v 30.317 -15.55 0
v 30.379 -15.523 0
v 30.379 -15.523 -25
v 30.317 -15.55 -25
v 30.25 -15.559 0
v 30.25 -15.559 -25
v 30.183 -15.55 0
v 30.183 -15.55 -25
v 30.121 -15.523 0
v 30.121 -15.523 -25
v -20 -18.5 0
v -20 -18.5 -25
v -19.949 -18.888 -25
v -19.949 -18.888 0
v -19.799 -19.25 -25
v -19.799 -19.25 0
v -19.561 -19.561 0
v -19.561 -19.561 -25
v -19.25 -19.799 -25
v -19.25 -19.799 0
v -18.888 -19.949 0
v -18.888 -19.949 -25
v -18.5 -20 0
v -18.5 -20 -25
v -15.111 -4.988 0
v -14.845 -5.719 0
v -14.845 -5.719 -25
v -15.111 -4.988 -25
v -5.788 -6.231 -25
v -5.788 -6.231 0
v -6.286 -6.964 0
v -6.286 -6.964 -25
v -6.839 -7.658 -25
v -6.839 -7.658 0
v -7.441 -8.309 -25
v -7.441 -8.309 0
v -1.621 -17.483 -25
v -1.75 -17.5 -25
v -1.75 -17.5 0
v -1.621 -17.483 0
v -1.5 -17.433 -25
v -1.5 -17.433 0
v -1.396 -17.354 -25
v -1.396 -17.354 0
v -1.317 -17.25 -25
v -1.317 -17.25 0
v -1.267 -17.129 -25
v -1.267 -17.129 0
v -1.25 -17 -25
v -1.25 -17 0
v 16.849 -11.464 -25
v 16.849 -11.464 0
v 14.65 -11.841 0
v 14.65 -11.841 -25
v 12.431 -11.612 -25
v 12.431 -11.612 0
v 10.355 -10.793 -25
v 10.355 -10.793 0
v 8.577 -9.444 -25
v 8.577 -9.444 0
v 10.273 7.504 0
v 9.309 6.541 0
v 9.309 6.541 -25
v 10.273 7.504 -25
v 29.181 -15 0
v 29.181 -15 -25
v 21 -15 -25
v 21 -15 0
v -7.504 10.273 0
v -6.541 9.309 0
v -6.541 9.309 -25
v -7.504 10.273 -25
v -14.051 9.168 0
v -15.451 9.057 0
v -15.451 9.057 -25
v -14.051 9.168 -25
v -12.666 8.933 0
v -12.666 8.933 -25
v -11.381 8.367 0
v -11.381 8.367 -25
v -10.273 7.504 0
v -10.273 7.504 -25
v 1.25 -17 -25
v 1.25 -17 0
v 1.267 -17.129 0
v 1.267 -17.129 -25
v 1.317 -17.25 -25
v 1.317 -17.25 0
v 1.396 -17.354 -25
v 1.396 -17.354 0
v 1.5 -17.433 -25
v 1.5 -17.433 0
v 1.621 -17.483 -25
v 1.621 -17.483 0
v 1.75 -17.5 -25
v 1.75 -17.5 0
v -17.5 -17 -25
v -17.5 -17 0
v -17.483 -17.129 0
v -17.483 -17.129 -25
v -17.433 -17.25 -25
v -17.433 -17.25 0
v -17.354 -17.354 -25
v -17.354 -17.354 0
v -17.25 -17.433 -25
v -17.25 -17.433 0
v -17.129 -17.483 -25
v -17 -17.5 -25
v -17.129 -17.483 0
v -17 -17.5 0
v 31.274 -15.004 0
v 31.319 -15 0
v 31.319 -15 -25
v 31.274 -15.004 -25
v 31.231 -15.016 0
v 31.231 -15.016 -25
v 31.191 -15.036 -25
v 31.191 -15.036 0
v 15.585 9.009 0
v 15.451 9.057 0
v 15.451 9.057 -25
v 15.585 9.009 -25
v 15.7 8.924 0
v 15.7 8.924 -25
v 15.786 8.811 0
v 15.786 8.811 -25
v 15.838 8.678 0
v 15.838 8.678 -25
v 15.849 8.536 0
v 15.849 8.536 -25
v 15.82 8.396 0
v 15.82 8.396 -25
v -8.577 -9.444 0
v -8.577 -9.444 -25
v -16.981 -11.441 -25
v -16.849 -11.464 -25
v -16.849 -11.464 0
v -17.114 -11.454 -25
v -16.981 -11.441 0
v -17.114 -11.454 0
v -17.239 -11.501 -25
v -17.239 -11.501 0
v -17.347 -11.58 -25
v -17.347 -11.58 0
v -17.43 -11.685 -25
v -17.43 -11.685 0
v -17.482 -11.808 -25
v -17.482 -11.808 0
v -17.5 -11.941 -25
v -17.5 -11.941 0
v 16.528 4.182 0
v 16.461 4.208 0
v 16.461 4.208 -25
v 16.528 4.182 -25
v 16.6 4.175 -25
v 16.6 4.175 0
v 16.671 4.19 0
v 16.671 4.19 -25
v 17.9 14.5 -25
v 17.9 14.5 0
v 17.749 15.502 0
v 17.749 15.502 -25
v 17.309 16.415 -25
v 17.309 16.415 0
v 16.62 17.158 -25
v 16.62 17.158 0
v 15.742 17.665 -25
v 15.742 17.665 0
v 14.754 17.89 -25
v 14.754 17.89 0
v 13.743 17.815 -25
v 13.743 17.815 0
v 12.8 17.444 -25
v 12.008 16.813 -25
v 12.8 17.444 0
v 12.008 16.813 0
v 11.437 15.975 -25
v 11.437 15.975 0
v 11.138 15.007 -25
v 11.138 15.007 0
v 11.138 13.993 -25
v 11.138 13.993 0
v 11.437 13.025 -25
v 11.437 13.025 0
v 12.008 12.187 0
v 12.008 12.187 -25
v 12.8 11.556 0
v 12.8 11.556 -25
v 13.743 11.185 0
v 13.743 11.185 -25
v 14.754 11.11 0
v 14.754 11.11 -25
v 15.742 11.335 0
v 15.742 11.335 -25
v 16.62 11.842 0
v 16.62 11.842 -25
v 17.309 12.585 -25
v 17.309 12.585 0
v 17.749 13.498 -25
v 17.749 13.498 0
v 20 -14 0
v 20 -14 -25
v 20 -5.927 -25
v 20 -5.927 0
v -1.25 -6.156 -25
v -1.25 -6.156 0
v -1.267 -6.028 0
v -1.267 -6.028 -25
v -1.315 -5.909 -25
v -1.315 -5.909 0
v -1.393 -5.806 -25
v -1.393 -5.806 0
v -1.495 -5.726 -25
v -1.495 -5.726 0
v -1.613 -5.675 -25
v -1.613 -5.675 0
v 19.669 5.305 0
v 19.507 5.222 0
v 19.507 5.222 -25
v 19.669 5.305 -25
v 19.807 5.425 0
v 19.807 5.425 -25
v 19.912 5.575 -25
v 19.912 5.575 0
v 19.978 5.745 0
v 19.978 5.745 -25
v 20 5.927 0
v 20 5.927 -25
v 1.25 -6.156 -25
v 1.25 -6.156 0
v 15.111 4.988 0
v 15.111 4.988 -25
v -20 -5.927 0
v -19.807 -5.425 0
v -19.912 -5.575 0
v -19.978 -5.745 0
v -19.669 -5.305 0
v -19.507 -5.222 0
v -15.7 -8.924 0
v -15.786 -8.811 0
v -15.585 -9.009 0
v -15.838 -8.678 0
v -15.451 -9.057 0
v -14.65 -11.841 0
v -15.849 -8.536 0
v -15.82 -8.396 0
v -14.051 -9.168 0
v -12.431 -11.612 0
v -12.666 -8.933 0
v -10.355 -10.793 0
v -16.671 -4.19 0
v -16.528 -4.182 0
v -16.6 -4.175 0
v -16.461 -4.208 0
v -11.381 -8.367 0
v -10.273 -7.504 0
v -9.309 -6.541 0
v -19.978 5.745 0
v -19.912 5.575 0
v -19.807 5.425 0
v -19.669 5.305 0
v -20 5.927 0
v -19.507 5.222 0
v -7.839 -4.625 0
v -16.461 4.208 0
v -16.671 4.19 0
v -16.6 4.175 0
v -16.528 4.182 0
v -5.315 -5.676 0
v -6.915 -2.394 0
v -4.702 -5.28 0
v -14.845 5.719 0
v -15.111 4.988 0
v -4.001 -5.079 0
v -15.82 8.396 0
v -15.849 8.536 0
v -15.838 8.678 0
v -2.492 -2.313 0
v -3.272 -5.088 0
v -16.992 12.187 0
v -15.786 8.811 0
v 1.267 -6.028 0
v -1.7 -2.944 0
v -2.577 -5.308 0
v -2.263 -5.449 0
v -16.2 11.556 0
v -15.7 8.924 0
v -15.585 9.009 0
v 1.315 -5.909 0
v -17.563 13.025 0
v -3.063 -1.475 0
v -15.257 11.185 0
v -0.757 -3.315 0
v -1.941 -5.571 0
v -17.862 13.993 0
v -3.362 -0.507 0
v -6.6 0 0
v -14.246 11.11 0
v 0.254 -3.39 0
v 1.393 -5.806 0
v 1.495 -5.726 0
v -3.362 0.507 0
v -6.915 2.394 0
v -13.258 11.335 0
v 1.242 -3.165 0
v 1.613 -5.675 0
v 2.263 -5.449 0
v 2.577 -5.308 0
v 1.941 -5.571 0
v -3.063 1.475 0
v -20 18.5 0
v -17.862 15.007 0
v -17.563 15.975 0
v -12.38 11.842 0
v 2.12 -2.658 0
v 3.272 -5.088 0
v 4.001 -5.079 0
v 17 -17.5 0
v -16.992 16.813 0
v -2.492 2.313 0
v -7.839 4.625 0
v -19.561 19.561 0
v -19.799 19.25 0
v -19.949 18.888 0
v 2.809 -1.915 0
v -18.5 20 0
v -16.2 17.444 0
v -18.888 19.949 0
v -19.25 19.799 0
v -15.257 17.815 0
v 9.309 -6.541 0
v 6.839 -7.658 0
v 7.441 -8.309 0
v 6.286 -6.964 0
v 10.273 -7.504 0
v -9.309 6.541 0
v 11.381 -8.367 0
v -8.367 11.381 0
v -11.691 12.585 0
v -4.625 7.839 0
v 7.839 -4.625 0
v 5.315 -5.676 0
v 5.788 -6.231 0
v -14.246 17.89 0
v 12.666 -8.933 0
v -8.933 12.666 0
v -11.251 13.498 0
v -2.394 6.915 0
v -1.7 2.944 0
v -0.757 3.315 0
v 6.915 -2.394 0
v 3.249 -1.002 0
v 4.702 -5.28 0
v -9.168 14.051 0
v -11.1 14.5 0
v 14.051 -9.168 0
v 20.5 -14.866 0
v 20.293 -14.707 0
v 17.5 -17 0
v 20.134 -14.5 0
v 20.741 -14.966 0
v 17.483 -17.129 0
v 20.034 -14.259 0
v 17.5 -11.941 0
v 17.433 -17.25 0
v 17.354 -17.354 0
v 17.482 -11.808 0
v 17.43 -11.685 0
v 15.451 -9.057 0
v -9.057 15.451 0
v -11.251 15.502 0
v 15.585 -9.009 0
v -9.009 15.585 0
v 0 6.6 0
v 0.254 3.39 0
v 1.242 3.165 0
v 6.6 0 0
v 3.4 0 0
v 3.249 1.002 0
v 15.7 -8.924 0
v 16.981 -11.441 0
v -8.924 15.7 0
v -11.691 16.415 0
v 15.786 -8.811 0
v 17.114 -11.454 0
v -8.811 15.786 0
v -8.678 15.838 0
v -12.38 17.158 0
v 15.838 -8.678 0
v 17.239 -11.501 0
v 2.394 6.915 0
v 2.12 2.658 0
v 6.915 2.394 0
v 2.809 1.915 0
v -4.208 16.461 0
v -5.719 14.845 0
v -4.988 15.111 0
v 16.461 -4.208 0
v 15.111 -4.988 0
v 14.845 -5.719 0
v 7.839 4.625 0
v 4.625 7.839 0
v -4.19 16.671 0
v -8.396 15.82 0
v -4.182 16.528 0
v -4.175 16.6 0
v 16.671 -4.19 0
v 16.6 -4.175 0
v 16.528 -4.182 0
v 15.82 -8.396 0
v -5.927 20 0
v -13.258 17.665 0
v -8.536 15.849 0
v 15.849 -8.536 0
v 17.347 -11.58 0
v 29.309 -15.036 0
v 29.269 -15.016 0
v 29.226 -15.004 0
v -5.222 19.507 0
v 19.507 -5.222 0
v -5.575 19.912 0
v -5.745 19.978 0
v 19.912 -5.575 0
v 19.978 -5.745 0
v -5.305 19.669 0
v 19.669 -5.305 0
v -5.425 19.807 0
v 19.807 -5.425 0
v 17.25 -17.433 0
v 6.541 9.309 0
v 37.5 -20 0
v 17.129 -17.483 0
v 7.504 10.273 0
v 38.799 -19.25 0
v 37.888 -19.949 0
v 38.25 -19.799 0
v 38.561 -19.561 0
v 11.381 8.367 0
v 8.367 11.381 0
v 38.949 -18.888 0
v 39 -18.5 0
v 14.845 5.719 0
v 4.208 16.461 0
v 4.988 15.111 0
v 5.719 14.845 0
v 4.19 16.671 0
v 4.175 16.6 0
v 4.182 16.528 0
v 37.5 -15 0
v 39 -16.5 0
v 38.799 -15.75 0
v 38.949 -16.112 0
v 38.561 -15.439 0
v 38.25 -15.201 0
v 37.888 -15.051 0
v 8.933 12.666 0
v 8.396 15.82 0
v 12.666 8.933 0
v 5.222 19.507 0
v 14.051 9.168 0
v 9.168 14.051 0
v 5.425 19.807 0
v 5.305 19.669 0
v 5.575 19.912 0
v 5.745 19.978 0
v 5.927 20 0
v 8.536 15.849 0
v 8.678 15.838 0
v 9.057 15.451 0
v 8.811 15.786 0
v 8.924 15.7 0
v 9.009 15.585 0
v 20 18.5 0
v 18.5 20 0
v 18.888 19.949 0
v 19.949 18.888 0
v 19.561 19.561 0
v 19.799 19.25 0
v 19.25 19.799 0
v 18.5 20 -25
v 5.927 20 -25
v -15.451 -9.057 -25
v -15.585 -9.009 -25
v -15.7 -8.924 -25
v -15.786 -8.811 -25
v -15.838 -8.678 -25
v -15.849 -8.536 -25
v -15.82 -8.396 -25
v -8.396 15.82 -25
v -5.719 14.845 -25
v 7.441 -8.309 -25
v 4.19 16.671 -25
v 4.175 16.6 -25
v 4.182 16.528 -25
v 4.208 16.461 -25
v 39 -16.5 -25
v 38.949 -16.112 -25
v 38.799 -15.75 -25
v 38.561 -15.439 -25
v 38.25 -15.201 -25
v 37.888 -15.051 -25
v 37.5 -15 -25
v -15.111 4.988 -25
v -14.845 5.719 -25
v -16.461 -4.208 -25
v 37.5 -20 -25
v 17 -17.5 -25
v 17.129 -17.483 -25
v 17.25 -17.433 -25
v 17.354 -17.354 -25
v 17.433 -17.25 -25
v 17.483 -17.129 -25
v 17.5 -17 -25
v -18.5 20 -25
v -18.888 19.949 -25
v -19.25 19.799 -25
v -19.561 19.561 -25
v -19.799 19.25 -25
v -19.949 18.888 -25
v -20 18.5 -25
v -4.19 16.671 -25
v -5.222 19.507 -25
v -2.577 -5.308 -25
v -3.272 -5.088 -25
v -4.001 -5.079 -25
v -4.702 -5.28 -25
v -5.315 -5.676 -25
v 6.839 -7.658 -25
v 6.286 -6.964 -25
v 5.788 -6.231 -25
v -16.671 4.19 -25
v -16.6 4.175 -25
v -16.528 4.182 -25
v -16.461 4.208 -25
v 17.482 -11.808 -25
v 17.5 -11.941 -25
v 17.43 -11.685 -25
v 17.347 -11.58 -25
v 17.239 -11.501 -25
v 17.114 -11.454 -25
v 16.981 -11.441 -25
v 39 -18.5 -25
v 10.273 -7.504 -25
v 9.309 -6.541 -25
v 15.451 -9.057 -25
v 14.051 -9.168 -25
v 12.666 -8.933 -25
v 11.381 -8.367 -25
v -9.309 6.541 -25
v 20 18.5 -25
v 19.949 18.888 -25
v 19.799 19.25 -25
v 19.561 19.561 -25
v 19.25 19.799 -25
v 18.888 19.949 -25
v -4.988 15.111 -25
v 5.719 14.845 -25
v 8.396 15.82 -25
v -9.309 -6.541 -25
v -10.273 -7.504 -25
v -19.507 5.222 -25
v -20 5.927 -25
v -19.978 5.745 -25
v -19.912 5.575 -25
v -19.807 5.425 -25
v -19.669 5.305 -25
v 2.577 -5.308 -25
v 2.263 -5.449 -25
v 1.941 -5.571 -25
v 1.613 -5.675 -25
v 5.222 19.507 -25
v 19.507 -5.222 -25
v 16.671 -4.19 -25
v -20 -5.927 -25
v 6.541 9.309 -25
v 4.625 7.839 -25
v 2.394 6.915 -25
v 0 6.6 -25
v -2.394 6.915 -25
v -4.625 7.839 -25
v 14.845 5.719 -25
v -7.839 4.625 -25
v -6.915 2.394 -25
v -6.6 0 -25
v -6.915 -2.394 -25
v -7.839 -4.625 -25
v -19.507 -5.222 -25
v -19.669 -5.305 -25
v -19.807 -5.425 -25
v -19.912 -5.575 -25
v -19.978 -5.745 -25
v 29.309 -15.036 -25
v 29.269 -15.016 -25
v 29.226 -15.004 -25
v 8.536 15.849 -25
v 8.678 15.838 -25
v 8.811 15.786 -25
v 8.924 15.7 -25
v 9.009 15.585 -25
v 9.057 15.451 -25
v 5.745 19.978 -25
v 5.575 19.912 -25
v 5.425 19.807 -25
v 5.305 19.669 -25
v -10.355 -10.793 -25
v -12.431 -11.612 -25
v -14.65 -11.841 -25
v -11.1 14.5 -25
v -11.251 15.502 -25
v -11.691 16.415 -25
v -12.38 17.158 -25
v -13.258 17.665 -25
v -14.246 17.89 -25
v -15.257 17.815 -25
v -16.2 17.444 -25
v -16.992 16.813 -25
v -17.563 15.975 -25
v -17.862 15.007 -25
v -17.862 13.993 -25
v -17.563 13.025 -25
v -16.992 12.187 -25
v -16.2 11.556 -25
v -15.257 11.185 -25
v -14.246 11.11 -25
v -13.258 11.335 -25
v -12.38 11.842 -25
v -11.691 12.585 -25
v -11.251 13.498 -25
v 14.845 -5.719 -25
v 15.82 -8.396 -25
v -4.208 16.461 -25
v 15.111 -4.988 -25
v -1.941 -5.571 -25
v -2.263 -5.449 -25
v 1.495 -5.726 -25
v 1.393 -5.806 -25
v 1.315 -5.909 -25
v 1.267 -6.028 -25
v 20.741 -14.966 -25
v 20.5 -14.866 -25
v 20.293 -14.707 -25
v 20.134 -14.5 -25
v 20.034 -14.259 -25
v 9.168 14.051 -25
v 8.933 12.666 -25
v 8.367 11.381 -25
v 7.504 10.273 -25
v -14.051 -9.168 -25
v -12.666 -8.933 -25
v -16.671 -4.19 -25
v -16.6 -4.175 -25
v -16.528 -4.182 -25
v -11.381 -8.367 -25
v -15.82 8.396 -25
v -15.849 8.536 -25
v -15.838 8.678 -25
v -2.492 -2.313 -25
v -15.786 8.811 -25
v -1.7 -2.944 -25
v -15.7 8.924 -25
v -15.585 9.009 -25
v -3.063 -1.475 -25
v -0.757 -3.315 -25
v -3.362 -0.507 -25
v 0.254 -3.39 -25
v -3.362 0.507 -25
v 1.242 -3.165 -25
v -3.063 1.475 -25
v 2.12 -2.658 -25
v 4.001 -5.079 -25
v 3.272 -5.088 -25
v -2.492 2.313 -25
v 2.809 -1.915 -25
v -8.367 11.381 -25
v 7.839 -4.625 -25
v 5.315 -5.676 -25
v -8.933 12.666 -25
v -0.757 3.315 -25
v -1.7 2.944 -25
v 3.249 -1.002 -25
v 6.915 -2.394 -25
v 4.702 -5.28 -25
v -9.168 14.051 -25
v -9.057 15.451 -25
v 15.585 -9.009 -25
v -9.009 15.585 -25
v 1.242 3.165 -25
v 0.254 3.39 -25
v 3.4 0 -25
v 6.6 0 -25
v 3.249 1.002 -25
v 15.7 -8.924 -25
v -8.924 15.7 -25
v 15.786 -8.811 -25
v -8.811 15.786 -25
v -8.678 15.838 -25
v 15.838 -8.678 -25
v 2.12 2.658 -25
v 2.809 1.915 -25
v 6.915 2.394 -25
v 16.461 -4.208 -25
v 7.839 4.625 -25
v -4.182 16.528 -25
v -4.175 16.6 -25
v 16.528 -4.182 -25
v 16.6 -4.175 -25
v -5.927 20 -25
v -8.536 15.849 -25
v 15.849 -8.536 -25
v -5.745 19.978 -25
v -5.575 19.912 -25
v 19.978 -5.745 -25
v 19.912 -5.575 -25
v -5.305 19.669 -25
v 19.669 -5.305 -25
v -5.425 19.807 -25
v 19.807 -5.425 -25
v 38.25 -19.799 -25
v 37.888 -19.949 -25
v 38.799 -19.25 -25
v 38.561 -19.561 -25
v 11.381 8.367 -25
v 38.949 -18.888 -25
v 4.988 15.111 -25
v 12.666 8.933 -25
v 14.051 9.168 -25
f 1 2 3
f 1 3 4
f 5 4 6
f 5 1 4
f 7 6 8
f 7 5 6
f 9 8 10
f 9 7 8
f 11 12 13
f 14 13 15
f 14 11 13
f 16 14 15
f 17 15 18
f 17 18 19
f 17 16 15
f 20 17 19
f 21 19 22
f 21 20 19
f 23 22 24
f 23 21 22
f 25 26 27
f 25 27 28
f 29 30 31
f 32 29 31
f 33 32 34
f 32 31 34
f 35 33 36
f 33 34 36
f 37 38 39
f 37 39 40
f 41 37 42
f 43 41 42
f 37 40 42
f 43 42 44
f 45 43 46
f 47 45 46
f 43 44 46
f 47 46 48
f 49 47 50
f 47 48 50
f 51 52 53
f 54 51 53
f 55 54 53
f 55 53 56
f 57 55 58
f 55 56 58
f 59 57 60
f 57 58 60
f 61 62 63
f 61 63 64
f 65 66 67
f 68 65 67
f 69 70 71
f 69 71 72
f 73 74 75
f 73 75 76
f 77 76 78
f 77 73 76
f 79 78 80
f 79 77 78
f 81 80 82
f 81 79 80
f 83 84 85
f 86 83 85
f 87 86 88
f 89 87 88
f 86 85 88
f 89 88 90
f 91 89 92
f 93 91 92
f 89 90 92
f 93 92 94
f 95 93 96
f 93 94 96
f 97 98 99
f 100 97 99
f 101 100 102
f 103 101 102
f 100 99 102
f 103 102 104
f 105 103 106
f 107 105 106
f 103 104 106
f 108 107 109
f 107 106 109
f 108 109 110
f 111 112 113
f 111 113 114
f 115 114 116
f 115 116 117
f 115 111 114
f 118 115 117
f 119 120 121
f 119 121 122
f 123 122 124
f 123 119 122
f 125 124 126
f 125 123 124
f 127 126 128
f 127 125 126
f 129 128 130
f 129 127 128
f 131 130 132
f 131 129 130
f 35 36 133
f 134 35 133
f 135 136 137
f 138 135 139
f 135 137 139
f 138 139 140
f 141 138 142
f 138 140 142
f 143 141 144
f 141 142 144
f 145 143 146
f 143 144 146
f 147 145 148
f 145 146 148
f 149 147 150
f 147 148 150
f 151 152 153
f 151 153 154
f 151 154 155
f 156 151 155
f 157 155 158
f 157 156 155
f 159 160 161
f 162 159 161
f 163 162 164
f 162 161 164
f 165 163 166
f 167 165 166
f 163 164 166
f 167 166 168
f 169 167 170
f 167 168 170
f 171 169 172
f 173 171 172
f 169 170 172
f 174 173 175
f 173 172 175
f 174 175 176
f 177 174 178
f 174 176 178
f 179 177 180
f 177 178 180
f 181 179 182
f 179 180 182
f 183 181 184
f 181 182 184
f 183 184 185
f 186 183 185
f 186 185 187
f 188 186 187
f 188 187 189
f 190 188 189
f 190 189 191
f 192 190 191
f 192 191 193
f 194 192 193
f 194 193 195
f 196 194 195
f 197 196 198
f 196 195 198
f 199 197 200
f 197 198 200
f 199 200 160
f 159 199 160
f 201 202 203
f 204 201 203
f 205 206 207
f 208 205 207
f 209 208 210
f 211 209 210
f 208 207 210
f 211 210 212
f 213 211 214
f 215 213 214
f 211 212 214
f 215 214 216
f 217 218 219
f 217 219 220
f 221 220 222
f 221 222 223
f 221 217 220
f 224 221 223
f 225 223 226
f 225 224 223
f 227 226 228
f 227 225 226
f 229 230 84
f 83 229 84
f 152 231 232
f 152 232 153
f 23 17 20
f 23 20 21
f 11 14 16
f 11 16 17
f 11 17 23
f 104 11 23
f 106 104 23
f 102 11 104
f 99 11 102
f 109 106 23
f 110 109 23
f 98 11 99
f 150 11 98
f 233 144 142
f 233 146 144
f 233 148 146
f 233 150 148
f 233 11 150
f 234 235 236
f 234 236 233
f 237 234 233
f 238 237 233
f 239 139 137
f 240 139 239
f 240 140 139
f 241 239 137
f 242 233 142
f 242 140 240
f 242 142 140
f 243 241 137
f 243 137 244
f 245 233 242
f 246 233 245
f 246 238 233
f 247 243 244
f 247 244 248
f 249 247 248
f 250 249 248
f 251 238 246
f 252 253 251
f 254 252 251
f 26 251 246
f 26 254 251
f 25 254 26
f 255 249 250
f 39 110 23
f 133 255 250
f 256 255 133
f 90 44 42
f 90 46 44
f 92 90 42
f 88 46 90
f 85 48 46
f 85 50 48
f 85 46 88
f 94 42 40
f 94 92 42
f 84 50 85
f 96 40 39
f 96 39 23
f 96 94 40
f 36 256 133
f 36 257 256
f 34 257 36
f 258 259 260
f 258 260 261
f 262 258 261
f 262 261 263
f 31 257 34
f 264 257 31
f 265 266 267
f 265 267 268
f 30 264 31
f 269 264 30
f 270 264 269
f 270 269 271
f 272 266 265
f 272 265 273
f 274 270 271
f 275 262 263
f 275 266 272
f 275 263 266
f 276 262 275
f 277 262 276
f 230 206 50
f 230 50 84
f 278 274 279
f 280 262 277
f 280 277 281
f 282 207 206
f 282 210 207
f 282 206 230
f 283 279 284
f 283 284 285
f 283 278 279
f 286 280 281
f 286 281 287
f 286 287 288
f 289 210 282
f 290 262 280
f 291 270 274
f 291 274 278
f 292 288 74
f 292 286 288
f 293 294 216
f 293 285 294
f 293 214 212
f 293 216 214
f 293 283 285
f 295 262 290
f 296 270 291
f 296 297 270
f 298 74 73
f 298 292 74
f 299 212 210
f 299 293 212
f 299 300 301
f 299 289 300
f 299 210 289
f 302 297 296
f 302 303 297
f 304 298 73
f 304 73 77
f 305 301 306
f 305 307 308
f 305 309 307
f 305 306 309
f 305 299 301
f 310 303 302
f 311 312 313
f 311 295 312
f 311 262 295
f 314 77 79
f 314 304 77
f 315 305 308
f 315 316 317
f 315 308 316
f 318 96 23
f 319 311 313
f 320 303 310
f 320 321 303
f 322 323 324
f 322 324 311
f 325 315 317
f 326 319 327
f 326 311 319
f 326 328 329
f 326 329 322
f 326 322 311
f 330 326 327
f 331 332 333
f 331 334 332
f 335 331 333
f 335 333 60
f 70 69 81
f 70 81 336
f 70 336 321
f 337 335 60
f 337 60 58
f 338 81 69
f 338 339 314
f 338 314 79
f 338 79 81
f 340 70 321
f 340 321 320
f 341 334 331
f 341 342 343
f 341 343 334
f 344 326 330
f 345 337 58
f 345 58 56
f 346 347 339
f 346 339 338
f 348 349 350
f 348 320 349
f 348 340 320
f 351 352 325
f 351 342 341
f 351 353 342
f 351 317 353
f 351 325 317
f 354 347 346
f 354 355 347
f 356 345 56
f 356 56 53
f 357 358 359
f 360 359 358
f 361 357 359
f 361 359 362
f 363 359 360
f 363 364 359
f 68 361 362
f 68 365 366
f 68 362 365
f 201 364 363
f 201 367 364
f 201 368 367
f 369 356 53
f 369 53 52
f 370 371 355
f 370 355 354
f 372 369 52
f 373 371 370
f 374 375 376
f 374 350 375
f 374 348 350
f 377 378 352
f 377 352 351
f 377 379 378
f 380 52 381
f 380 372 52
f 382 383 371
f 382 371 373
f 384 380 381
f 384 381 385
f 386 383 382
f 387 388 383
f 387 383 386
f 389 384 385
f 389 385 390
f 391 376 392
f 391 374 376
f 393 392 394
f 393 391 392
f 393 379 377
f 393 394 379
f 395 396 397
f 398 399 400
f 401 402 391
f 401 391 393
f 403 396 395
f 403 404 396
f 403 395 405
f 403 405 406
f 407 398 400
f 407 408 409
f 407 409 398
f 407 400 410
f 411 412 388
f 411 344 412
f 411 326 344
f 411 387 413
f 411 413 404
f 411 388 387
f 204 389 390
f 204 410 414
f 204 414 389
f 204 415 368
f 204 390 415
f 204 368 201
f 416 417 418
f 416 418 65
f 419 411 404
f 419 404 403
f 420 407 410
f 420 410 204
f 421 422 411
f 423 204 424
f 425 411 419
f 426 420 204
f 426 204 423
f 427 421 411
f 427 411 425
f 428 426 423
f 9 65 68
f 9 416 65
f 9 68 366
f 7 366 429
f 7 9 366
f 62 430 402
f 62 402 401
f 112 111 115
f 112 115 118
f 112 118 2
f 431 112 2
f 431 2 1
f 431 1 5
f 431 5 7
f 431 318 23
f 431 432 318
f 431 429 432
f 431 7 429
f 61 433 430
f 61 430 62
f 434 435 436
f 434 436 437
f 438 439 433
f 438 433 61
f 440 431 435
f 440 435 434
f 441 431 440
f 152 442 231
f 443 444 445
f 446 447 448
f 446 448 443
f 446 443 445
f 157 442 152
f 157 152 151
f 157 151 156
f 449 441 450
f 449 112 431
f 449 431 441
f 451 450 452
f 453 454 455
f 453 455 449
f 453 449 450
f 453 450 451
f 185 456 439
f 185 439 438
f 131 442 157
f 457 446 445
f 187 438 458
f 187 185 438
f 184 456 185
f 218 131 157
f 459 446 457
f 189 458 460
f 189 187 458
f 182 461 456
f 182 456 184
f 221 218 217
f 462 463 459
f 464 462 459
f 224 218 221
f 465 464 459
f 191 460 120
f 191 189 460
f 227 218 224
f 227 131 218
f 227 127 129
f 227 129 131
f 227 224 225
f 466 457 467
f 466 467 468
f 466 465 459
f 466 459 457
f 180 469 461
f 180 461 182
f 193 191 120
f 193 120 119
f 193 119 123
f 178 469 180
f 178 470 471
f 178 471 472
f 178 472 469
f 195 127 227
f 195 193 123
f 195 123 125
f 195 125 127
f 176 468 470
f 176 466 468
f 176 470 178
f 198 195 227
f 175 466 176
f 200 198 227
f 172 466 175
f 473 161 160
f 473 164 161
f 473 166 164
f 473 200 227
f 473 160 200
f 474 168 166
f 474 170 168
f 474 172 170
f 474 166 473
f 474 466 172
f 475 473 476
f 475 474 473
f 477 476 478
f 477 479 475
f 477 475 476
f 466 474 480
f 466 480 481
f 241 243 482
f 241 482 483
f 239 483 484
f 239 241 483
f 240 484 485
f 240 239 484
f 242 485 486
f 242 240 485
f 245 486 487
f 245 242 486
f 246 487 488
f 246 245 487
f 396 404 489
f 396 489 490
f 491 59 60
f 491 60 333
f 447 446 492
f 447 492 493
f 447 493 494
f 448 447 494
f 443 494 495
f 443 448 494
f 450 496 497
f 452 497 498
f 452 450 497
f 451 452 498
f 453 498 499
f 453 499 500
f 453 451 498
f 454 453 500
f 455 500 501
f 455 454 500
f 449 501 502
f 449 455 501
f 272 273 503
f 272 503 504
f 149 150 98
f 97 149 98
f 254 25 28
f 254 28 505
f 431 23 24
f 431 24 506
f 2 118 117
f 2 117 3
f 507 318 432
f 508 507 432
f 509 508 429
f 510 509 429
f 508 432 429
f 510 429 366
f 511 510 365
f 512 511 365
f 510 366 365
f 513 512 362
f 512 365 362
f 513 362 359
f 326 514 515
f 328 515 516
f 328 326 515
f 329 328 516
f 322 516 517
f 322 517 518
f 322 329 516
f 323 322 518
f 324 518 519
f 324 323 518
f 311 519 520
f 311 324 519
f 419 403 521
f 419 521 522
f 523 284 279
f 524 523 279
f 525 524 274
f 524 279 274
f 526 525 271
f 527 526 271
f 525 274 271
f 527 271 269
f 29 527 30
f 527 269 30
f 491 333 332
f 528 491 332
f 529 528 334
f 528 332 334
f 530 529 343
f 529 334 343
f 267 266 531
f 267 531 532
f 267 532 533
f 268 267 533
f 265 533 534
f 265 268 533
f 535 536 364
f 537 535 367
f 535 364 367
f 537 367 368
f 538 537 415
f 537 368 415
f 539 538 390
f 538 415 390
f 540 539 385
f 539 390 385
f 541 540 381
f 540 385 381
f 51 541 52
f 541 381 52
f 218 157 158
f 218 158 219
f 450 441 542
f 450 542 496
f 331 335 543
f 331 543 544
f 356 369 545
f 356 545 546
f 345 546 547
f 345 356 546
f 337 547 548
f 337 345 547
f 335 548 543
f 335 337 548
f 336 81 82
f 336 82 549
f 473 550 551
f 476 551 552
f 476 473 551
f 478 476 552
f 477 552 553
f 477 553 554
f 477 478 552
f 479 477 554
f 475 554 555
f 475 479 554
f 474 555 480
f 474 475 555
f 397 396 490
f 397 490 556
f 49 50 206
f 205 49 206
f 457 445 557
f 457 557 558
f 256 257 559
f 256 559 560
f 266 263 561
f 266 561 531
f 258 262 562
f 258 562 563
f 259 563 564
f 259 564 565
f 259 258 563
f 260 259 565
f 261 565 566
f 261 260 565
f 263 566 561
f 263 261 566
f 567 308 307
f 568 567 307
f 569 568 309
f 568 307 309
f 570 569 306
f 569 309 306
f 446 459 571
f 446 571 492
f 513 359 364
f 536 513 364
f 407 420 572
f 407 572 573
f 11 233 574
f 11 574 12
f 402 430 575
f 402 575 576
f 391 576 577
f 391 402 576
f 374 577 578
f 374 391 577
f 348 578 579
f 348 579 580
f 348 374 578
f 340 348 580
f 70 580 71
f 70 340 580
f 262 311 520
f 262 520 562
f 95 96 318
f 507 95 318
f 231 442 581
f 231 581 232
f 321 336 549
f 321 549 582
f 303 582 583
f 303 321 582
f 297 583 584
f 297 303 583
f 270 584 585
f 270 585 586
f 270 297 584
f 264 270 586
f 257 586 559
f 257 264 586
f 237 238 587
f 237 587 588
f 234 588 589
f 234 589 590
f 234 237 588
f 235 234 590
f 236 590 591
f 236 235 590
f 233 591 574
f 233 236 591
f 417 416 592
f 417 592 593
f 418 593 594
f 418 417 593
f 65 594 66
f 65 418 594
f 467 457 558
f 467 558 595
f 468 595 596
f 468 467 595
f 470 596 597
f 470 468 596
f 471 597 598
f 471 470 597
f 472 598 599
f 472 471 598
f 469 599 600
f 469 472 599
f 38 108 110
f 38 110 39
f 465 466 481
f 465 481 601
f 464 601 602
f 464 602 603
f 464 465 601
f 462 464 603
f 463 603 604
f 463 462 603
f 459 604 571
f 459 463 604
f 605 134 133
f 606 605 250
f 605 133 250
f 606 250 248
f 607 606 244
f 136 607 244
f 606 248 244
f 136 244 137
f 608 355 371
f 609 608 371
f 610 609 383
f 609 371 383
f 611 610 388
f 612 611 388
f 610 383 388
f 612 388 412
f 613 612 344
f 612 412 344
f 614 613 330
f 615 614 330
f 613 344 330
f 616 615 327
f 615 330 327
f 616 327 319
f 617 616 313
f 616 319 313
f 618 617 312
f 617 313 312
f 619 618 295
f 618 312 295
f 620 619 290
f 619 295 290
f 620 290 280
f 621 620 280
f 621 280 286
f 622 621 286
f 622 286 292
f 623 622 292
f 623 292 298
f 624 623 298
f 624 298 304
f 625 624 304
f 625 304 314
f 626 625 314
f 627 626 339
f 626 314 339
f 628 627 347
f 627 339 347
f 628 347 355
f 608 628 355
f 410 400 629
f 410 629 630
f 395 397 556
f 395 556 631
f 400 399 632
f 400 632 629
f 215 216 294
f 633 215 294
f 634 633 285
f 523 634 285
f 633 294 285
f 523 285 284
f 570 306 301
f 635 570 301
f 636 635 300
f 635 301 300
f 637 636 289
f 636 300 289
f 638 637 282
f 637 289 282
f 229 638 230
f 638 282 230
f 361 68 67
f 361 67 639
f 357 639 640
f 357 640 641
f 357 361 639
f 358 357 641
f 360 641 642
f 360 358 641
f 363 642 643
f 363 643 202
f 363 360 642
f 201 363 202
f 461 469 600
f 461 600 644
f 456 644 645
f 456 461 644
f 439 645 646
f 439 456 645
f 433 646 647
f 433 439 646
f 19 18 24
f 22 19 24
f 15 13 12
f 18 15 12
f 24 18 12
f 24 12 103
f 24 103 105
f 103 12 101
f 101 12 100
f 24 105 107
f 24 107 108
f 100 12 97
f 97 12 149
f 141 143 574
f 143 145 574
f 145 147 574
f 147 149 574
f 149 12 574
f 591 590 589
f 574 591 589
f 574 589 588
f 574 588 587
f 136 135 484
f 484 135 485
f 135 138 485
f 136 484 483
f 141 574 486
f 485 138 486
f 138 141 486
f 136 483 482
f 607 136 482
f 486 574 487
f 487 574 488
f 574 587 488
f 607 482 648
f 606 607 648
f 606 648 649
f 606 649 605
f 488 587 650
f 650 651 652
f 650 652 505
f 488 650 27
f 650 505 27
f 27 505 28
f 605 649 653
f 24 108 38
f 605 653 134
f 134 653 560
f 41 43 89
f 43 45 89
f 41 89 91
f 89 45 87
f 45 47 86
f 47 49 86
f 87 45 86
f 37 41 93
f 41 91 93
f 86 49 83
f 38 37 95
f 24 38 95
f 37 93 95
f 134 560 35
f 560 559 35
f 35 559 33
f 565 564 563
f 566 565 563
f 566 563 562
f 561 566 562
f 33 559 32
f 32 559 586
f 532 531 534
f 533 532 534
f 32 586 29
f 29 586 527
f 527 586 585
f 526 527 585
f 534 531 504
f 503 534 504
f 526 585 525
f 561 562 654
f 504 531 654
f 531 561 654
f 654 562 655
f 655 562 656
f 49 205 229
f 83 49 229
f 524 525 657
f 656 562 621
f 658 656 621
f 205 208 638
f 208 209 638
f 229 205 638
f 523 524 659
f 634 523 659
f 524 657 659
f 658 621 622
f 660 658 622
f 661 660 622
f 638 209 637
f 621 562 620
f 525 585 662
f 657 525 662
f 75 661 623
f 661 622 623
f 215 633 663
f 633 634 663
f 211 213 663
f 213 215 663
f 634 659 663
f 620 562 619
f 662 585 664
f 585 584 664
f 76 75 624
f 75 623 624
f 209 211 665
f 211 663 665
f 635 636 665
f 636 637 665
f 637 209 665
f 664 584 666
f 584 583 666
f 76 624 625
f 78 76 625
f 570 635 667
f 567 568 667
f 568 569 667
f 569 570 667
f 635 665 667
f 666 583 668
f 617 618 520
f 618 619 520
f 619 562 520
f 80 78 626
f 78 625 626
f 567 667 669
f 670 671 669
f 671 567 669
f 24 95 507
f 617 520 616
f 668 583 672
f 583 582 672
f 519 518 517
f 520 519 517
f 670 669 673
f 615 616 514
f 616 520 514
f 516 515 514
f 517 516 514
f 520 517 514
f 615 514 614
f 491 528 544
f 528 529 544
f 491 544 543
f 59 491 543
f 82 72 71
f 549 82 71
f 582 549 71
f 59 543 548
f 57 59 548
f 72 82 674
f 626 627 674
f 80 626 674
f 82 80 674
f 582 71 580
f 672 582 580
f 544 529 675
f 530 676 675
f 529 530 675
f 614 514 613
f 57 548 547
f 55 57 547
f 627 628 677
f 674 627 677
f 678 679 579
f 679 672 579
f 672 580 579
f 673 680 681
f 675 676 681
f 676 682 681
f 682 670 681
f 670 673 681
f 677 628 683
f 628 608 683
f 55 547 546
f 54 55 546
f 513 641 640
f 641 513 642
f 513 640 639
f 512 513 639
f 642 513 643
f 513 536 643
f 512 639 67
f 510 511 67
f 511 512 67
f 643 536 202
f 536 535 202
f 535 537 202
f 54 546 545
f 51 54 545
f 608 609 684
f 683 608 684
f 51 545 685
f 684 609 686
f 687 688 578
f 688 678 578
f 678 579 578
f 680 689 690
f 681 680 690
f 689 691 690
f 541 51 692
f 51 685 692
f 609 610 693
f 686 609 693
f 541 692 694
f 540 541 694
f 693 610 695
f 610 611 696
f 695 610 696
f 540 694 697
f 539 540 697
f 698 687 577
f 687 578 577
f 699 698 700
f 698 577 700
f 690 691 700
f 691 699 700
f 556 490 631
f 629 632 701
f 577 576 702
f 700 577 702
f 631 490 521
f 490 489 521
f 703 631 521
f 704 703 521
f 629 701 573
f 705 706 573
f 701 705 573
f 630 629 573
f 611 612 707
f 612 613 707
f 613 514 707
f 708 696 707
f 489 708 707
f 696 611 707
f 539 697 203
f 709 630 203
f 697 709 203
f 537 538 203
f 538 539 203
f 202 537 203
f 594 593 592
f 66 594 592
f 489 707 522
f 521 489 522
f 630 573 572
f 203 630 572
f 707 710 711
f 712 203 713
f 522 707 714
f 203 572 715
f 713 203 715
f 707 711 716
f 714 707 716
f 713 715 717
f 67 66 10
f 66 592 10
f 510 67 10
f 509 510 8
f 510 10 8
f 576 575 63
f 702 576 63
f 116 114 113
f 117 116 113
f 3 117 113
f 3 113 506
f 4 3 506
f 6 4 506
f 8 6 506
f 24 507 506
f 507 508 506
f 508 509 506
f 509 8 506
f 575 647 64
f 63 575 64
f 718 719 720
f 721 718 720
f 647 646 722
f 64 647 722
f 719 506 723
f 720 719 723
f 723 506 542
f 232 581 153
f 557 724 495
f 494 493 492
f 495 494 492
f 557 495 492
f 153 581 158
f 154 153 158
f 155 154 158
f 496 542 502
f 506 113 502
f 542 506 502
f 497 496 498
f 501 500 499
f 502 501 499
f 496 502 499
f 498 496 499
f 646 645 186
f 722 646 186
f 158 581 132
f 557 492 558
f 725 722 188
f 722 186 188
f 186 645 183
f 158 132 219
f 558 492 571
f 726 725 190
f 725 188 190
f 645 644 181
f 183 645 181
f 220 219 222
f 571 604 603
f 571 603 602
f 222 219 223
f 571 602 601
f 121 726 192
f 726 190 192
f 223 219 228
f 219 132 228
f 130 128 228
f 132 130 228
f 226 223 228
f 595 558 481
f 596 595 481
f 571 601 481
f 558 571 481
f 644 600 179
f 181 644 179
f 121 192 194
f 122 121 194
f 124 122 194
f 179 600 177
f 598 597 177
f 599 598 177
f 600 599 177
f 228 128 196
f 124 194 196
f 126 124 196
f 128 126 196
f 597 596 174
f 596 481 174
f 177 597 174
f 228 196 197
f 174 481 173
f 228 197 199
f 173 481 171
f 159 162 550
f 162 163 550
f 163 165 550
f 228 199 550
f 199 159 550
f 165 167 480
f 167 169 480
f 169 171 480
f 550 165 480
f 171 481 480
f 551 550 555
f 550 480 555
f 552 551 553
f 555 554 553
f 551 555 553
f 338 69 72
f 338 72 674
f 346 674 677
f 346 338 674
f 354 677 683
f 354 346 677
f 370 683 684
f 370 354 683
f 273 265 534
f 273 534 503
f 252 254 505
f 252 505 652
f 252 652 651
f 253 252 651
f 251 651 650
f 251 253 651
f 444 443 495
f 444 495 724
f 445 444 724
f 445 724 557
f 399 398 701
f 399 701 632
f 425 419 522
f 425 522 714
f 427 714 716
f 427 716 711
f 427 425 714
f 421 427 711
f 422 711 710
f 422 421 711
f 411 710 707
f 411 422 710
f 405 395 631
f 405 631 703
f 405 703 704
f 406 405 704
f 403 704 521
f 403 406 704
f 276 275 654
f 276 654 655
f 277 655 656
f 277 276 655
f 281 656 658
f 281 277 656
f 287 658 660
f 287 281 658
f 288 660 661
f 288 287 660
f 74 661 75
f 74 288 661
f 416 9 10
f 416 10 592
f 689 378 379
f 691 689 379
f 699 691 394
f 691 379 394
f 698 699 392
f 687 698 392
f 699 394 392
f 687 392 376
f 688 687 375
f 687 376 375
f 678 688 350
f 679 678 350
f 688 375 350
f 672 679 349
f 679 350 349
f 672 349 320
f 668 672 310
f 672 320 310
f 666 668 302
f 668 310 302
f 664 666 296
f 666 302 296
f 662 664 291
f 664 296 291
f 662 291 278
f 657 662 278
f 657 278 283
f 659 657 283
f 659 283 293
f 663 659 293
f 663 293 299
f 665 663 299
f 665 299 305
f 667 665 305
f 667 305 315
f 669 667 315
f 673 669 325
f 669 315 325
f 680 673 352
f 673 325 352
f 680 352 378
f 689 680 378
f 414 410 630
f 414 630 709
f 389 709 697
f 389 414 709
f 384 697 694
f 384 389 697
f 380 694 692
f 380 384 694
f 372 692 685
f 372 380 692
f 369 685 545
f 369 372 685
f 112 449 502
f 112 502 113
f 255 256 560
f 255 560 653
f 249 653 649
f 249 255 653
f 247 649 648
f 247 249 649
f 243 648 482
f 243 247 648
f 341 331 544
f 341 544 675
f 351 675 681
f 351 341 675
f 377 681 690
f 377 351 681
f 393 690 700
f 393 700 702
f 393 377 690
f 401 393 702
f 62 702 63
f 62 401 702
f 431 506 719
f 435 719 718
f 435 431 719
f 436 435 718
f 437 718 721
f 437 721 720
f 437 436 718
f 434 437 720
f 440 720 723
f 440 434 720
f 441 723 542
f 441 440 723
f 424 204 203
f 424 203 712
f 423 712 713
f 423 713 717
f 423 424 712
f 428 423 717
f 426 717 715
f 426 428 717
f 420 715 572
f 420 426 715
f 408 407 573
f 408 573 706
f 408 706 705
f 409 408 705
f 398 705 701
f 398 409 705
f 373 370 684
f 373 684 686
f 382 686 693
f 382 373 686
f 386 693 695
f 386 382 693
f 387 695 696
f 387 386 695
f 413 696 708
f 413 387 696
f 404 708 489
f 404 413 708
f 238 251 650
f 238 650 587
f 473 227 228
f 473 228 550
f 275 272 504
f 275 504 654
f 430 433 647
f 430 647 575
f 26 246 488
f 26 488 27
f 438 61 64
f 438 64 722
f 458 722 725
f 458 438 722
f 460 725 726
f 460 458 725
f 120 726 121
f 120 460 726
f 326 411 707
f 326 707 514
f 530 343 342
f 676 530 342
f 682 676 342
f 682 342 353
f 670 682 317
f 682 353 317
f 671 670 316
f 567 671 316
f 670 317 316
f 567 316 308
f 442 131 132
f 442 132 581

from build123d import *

# Parameters (mm, degrees)
SK_MAIN_EXTRUSION_R  = 3.4
MAIN_EXTRUSION_DEPTH = 25


with BuildPart() as part:
    # Sk Main Extrusion → Main Extrusion (new body)
    with BuildSketch(Plane.XY):
        with BuildLine():
            Line((-16.671180212, -4.190076845), (-19.506515107, -5.222054351))
            ThreePointArc((-19.506515107, -5.222054351), (-19.864364033, -5.496641489), (-20, -5.926823816))
            Line((-20, -5.926823816), (-20, -18.5))
            ThreePointArc((-20, -18.5), (-19.560660172, -19.560660172), (-18.5, -20))
            Line((-18.5, -20), (37.5, -20))
            ThreePointArc((37.5, -20), (38.560660172, -19.560660172), (39, -18.5))
            Line((39, -18.5), (39, -16.5))
            ThreePointArc((39, -16.5), (38.560660172, -15.439339828), (37.5, -15))
            Line((37.5, -15), (31.319331136, -15))
            ThreePointArc((31.319331136, -15), (31.252521542, -15.009092387), (31.190571617, -15.035708175))
            Line((31.190571617, -15.035708175), (30.378759519, -15.523494095))
            ThreePointArc((30.378759519, -15.523494095), (30.25, -15.55920227), (30.121240481, -15.523494095))
            Line((30.121240481, -15.523494095), (29.309428383, -15.035708175))
            ThreePointArc((29.309428383, -15.035708175), (29.247478458, -15.009092387), (29.180668864, -15))
            Line((29.180668864, -15), (21, -15))
            ThreePointArc((21, -15), (20.292893219, -14.707106781), (20, -14))
            Line((20, -14), (20, -5.926823816))
            ThreePointArc((20, -5.926823816), (19.864364033, -5.496641489), (19.506515107, -5.222054351))
            Line((19.506515107, -5.222054351), (16.671180212, -4.190076845))
            ThreePointArc((16.671180212, -4.190076845), (16.563886241, -4.175951325), (16.460675177, -4.208493649))
            Line((16.460675177, -4.208493649), (15.111296024, -4.987558066))
            Line((15.111296024, -4.987558066), (14.845251581, -5.718509166))
            Line((14.845251581, -5.718509166), (15.81984631, -8.396186179))
            ThreePointArc((15.81984631, -8.396186179), (15.786489799, -8.811074612), (15.450654467, -9.056960151))
            ThreePointArc((15.450654467, -9.056960151), (12.665882372, -8.933433013), (10.272684887, -7.504160339))
            Line((10.272684887, -7.504160339), (9.309262274, -6.540737726))
            ThreePointArc((9.309262274, -6.540737726), (6.6, 0), (9.309262274, 6.540737726))
            Line((9.309262274, 6.540737726), (10.272684887, 7.504160339))
            ThreePointArc((10.272684887, 7.504160339), (12.665882372, 8.933433013), (15.450654467, 9.056960151))
            ThreePointArc((15.450654467, 9.056960151), (15.786489799, 8.811074612), (15.81984631, 8.396186179))
            Line((15.81984631, 8.396186179), (14.845251581, 5.718509166))
            Line((14.845251581, 5.718509166), (15.111296024, 4.987558066))
            Line((15.111296024, 4.987558066), (16.460675177, 4.208493649))
            ThreePointArc((16.460675177, 4.208493649), (16.563886241, 4.175951325), (16.671180212, 4.190076845))
            Line((16.671180212, 4.190076845), (19.506515107, 5.222054351))
            ThreePointArc((19.506515107, 5.222054351), (19.864364033, 5.496641489), (20, 5.926823816))
            Line((20, 5.926823816), (20, 18.5))
            ThreePointArc((20, 18.5), (19.560660172, 19.560660172), (18.5, 20))
            Line((18.5, 20), (5.926823816, 20))
            ThreePointArc((5.926823816, 20), (5.496641489, 19.864364033), (5.222054351, 19.506515107))
            Line((5.222054351, 19.506515107), (4.190076845, 16.671180212))
            ThreePointArc((4.190076845, 16.671180212), (4.175951325, 16.563886241), (4.208493649, 16.460675177))
            Line((4.208493649, 16.460675177), (4.987558066, 15.111296024))
            Line((4.987558066, 15.111296024), (5.718509166, 14.845251581))
            Line((5.718509166, 14.845251581), (8.396186179, 15.81984631))
            ThreePointArc((8.396186179, 15.81984631), (8.811074612, 15.786489799), (9.056960151, 15.450654467))
            ThreePointArc((9.056960151, 15.450654467), (8.933433013, 12.665882372), (7.504160339, 10.272684887))
            Line((7.504160339, 10.272684887), (6.540737726, 9.309262274))
            ThreePointArc((6.540737726, 9.309262274), (0, 6.6), (-6.540737726, 9.309262274))
            Line((-6.540737726, 9.309262274), (-7.504160339, 10.272684887))
            ThreePointArc((-7.504160339, 10.272684887), (-8.933433013, 12.665882372), (-9.056960151, 15.450654467))
            ThreePointArc((-9.056960151, 15.450654467), (-8.811074612, 15.786489799), (-8.396186179, 15.81984631))
            Line((-8.396186179, 15.81984631), (-5.718509166, 14.845251581))
            Line((-5.718509166, 14.845251581), (-4.987558066, 15.111296024))
            Line((-4.987558066, 15.111296024), (-4.208493649, 16.460675177))
            ThreePointArc((-4.208493649, 16.460675177), (-4.175951325, 16.563886241), (-4.190076845, 16.671180212))
            Line((-4.190076845, 16.671180212), (-5.222054351, 19.506515107))
            ThreePointArc((-5.222054351, 19.506515107), (-5.496641489, 19.864364033), (-5.926823816, 20))
            Line((-5.926823816, 20), (-18.5, 20))
            ThreePointArc((-18.5, 20), (-19.560660172, 19.560660172), (-20, 18.5))
            Line((-20, 18.5), (-20, 5.926823816))
            ThreePointArc((-20, 5.926823816), (-19.864364033, 5.496641489), (-19.506515107, 5.222054351))
            Line((-19.506515107, 5.222054351), (-16.671180212, 4.190076845))
            ThreePointArc((-16.671180212, 4.190076845), (-16.563886241, 4.175951325), (-16.460675177, 4.208493649))
            Line((-16.460675177, 4.208493649), (-15.111296024, 4.987558066))
            Line((-15.111296024, 4.987558066), (-14.845251581, 5.718509166))
            Line((-14.845251581, 5.718509166), (-15.81984631, 8.396186179))
            ThreePointArc((-15.81984631, 8.396186179), (-15.786489799, 8.811074612), (-15.450654467, 9.056960151))
            ThreePointArc((-15.450654467, 9.056960151), (-12.665882372, 8.933433013), (-10.272684887, 7.504160339))
            Line((-10.272684887, 7.504160339), (-9.309262274, 6.540737726))
            ThreePointArc((-9.309262274, 6.540737726), (-6.6, 0), (-9.309262274, -6.540737726))
            Line((-9.309262274, -6.540737726), (-10.272684887, -7.504160339))
            ThreePointArc((-10.272684887, -7.504160339), (-12.665882372, -8.933433013), (-15.450654467, -9.056960151))
            ThreePointArc((-15.450654467, -9.056960151), (-15.786489799, -8.811074612), (-15.81984631, -8.396186179))
            Line((-15.81984631, -8.396186179), (-14.845251581, -5.718509166))
            Line((-14.845251581, -5.718509166), (-15.111296024, -4.987558066))
            Line((-15.111296024, -4.987558066), (-16.460675177, -4.208493649))
            ThreePointArc((-16.460675177, -4.208493649), (-16.563886241, -4.175951325), (-16.671180212, -4.190076845))
        make_face()
        with Locations((14.5, 14.5)):
            Circle(SK_MAIN_EXTRUSION_R, mode=Mode.SUBTRACT)
        Circle(SK_MAIN_EXTRUSION_R, mode=Mode.SUBTRACT)
        with Locations((-14.5, 14.5)):
            Circle(SK_MAIN_EXTRUSION_R, mode=Mode.SUBTRACT)
        with BuildLine():
            Line((-7.441495321, -8.308504679), (-8.577273231, -9.444282589))
            ThreePointArc((-8.577273231, -9.444282589), (-12.430514315, -11.611987193), (-16.849169473, -11.464011904))
            ThreePointArc((-16.849169473, -11.464011904), (-17.295452819, -11.537349181), (-17.5, -11.940719521))
            Line((-17.5, -11.940719521), (-17.5, -17))
            ThreePointArc((-17.5, -17), (-17.353553391, -17.353553391), (-17, -17.5))
            Line((-17, -17.5), (-1.75, -17.5))
            ThreePointArc((-1.75, -17.5), (-1.396446609, -17.353553391), (-1.25, -17))
            Line((-1.25, -17), (-1.25, -6.156094541))
            ThreePointArc((-1.25, -6.156094541), (-1.351026708, -5.854730455), (-1.61328125, -5.675149655))
            ThreePointArc((-1.61328125, -5.675149655), (-2.10305366, -5.51245547), (-2.576734694, -5.307583096))
            ThreePointArc((-2.576734694, -5.307583096), (-4.359333373, -5.153883821), (-5.788120301, -6.230846881))
            ThreePointArc((-5.788120301, -6.230846881), (-6.555931161, -7.316529108), (-7.441495321, -8.308504679))
        make_face(mode=Mode.SUBTRACT)
        with BuildLine():
            Line((1.25, -6.156094541), (1.25, -17))
            ThreePointArc((1.25, -17), (1.396446609, -17.353553391), (1.75, -17.5))
            Line((1.75, -17.5), (17, -17.5))
            ThreePointArc((17, -17.5), (17.353553391, -17.353553391), (17.5, -17))
            Line((17.5, -17), (17.5, -11.940719521))
            ThreePointArc((17.5, -11.940719521), (17.295452819, -11.537349181), (16.849169473, -11.464011904))
            ThreePointArc((16.849169473, -11.464011904), (12.430514315, -11.611987193), (8.577273231, -9.444282589))
            Line((8.577273231, -9.444282589), (7.441495321, -8.308504679))
            ThreePointArc((7.441495321, -8.308504679), (6.555931161, -7.316529108), (5.788120301, -6.230846881))
            ThreePointArc((5.788120301, -6.230846881), (4.359333373, -5.153883821), (2.576734694, -5.307583096))
            ThreePointArc((2.576734694, -5.307583096), (2.10305366, -5.51245547), (1.61328125, -5.675149655))
            ThreePointArc((1.61328125, -5.675149655), (1.351026708, -5.854730455), (1.25, -6.156094541))
        make_face(mode=Mode.SUBTRACT)
    extrude(amount=-MAIN_EXTRUSION_DEPTH)


solid = part.part
